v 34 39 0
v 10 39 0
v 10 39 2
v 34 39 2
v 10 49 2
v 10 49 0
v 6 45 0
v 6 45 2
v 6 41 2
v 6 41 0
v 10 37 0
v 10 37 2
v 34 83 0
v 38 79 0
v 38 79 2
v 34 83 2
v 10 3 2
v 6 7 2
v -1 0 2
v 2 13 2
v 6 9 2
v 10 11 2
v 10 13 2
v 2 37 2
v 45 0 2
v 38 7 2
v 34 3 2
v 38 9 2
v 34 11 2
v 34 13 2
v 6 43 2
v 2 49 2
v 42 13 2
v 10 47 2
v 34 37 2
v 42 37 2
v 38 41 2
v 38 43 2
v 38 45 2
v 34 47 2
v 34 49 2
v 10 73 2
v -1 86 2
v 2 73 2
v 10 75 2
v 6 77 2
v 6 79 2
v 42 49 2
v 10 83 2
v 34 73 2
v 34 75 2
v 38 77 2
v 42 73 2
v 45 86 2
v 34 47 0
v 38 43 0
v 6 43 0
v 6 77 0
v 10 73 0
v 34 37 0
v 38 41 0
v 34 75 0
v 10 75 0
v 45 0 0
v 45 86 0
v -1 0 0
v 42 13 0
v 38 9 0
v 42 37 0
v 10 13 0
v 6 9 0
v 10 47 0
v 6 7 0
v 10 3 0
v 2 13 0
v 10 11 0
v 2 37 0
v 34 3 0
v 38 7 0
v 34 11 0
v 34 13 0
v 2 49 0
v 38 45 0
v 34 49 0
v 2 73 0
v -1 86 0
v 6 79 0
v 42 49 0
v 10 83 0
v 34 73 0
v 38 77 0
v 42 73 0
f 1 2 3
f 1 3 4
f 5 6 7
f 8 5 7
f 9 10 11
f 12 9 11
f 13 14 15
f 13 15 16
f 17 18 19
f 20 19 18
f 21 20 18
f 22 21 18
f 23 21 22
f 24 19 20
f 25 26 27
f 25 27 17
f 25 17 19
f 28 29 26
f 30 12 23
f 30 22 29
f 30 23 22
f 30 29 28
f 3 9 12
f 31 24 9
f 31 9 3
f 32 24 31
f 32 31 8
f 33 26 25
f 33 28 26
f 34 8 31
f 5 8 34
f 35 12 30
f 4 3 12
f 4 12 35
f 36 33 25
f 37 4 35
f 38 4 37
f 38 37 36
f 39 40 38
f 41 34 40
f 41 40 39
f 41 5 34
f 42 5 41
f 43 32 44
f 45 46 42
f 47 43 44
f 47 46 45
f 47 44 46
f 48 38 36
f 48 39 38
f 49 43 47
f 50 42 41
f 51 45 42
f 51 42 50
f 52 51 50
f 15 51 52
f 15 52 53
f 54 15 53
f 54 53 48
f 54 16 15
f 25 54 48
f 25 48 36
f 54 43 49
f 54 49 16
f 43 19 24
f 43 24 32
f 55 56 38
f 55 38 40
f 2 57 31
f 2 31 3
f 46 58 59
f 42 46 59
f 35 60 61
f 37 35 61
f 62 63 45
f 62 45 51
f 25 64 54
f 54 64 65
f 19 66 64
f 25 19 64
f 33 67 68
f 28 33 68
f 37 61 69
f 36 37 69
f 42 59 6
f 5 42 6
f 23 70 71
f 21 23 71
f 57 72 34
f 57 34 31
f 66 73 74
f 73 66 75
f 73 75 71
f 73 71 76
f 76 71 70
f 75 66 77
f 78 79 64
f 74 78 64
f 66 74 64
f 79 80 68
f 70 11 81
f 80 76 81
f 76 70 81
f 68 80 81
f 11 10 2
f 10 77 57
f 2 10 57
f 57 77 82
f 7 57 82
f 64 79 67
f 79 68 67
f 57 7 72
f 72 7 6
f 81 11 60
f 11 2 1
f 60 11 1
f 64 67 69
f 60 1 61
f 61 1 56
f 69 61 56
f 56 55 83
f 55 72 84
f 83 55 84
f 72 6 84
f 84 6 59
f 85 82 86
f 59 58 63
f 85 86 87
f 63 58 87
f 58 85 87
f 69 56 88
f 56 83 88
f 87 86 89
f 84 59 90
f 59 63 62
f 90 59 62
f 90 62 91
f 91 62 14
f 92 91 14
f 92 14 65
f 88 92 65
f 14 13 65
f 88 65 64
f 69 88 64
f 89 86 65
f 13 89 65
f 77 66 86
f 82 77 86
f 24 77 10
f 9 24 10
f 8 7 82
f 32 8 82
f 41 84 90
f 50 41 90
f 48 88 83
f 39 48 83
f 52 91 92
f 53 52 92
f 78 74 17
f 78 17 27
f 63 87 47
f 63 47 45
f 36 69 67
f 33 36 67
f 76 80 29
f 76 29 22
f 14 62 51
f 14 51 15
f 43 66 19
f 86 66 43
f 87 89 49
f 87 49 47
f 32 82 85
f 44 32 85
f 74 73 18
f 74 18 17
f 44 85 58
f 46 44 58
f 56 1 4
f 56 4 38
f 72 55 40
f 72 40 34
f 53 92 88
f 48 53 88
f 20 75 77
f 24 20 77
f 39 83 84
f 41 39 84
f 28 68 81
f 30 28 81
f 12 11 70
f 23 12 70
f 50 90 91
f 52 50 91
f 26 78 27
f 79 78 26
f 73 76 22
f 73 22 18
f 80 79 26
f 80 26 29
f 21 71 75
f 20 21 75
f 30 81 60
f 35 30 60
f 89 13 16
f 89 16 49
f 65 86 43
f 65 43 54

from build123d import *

# Parameters (mm, degrees)
BOX011_W         = 46
BOX011_H         = 4
BOX011_DEPTH     = 10
BOX010_W         = 1
BOX010_H         = 90
BOX010_DEPTH     = 2
BOX_W            = 1
BOX_H            = 90
BOX_DEPTH        = 2
EXTRUDE006_DEPTH = 10
EXTRUDE005_DEPTH = 10
EXTRUDE004_DEPTH = 10
EXTRUDE_DEPTH    = 10
EXTRUDE003_DEPTH = 10
EXTRUDE002_DEPTH = 10
EXTRUDE001_DEPTH = 10
BOX001_W         = 44
BOX001_H         = 90
BOX001_DEPTH     = 2


with BuildPart() as cube011:
    # Box011 → Box011 (new body)
    with BuildSketch(Plane(origin=(-1, 86, -4), x_dir=(1, 0, 0), z_dir=(0, 0, 1))):
        with Locations((23, 2)):
            Rectangle(BOX011_W, BOX011_H)
    extrude(amount=BOX011_DEPTH)


with BuildPart() as cube010:
    # Box010 → Box010 (new body)
    with BuildSketch(Plane(origin=(44, 0, 0), x_dir=(1, 0, 0), z_dir=(0, 0, 1))):
        with Locations((0.5, 45)):
            Rectangle(BOX010_W, BOX010_H)
    extrude(amount=BOX010_DEPTH)


with BuildPart() as cube:
    # Box → Box (new body)
    with BuildSketch(Plane(origin=(-1, 0, 0), x_dir=(1, 0, 0), z_dir=(0, 0, 1))):
        with Locations((0.5, 45)):
            Rectangle(BOX_W, BOX_H)
    extrude(amount=BOX_DEPTH)


with BuildPart() as extrude_g:
    # Sketch008 (on Face6 of Box006) → Extrude006 (new body)
    with BuildSketch(Plane.XY.offset(10)):
        Polygon((10, 47), (6, 43), (10, 39), (34, 39), (38, 43), (34, 47), align=None)
    extrude(amount=EXTRUDE006_DEPTH)


with BuildPart() as extrude_g_1:
    # Extrude006 placement: moved
    add(extrude_g.part.moved(Location((0, 0, -14))))


with BuildPart() as extrude_f:
    # Sketch010 (on Face6 of Box008) → Extrude005 (new body)
    with BuildSketch(Plane.XY.offset(10)):
        Polygon((6, 77), (10, 73), (10, 49), (6, 45), (2, 49), (2, 73), align=None)
    extrude(amount=EXTRUDE005_DEPTH)


with BuildPart() as extrude_f_1:
    # Extrude005 placement: moved
    add(extrude_f.part.moved(Location((0, 0, -14))))


with BuildPart() as extrude_e:
    # Sketch011 (on Face6 of Box009) → Extrude004 (new body)
    with BuildSketch(Plane.XY.offset(10)):
        Polygon((6, 41), (10, 37), (10, 13), (6, 9), (2, 13), (2, 37), align=None)
    extrude(amount=EXTRUDE004_DEPTH)


with BuildPart() as extrude_e_1:
    # Extrude004 placement: moved
    add(extrude_e.part.moved(Location((0, 0, -14))))


with BuildPart() as extrude_d:
    # Sketch003 (on Face6 of Box001) → Extrude (new body)
    with BuildSketch(Plane.XY.offset(2)):
        Polygon((10, 11), (6, 7), (10, 3), (34, 3), (38, 7), (34, 11), align=None)
    extrude(amount=EXTRUDE_DEPTH)


with BuildPart() as extrude_d_1:
    # Extrude placement: moved
    add(extrude_d.part.moved(Location((0, 0, -6))))


with BuildPart() as extrude_c:
    # Sketch006 (on Face6 of Box004) → Extrude003 (new body)
    with BuildSketch(Plane.XY.offset(10)):
        Polygon((38, 41), (42, 37), (42, 13), (38, 9), (34, 13), (34, 37), align=None)
    extrude(amount=EXTRUDE003_DEPTH)


with BuildPart() as extrude_c_1:
    # Extrude003 placement: moved
    add(extrude_c.part.moved(Location((0, 0, -14))))


with BuildPart() as extrude_b:
    # Sketch007 (on Face6 of Box005) → Extrude002 (new body)
    with BuildSketch(Plane.XY.offset(10)):
        Polygon((38, 77), (42, 73), (42, 49), (38, 45), (34, 49), (34, 73), align=None)
    extrude(amount=EXTRUDE002_DEPTH)


with BuildPart() as extrude_b_1:
    # Extrude002 placement: moved
    add(extrude_b.part.moved(Location((0, 0, -14))))


with BuildPart() as extrude_a:
    # Sketch009 (on Face6 of Box007) → Extrude001 (new body)
    with BuildSketch(Plane.XY.offset(10)):
        Polygon((10, 83), (6, 79), (10, 75), (34, 75), (38, 79), (34, 83), align=None)
    extrude(amount=EXTRUDE001_DEPTH)


with BuildPart() as extrude_a_1:
    # Extrude001 placement: moved
    add(extrude_a.part.moved(Location((0, 0, -14))))


with BuildPart() as cut007:
    # Box001 → Box001 (new body)
    with BuildSketch(Plane.XY):
        with Locations((22, 45)):
            Rectangle(BOX001_W, BOX001_H)
    extrude(amount=BOX001_DEPTH)

    # Cut: cut Extrude_A
    add(extrude_a_1.part, mode=Mode.SUBTRACT)

    # Cut001: cut Extrude_B
    add(extrude_b_1.part, mode=Mode.SUBTRACT)

    # Cut002: cut Extrude_C
    add(extrude_c_1.part, mode=Mode.SUBTRACT)

    # Cut003: cut Extrude_D
    add(extrude_d_1.part, mode=Mode.SUBTRACT)

    # Cut004: cut Extrude_E
    add(extrude_e_1.part, mode=Mode.SUBTRACT)

    # Cut005: cut Extrude_F
    add(extrude_f_1.part, mode=Mode.SUBTRACT)

    # Cut006: cut Extrude_G
    add(extrude_g_1.part, mode=Mode.SUBTRACT)

    # Fusion: union Cube
    add(cube.part)

    # Fusion001: union Cube010
    add(cube010.part)

    # Cut007: cut Cube011
    add(cube011.part, mode=Mode.SUBTRACT)


solid = cut007.part
